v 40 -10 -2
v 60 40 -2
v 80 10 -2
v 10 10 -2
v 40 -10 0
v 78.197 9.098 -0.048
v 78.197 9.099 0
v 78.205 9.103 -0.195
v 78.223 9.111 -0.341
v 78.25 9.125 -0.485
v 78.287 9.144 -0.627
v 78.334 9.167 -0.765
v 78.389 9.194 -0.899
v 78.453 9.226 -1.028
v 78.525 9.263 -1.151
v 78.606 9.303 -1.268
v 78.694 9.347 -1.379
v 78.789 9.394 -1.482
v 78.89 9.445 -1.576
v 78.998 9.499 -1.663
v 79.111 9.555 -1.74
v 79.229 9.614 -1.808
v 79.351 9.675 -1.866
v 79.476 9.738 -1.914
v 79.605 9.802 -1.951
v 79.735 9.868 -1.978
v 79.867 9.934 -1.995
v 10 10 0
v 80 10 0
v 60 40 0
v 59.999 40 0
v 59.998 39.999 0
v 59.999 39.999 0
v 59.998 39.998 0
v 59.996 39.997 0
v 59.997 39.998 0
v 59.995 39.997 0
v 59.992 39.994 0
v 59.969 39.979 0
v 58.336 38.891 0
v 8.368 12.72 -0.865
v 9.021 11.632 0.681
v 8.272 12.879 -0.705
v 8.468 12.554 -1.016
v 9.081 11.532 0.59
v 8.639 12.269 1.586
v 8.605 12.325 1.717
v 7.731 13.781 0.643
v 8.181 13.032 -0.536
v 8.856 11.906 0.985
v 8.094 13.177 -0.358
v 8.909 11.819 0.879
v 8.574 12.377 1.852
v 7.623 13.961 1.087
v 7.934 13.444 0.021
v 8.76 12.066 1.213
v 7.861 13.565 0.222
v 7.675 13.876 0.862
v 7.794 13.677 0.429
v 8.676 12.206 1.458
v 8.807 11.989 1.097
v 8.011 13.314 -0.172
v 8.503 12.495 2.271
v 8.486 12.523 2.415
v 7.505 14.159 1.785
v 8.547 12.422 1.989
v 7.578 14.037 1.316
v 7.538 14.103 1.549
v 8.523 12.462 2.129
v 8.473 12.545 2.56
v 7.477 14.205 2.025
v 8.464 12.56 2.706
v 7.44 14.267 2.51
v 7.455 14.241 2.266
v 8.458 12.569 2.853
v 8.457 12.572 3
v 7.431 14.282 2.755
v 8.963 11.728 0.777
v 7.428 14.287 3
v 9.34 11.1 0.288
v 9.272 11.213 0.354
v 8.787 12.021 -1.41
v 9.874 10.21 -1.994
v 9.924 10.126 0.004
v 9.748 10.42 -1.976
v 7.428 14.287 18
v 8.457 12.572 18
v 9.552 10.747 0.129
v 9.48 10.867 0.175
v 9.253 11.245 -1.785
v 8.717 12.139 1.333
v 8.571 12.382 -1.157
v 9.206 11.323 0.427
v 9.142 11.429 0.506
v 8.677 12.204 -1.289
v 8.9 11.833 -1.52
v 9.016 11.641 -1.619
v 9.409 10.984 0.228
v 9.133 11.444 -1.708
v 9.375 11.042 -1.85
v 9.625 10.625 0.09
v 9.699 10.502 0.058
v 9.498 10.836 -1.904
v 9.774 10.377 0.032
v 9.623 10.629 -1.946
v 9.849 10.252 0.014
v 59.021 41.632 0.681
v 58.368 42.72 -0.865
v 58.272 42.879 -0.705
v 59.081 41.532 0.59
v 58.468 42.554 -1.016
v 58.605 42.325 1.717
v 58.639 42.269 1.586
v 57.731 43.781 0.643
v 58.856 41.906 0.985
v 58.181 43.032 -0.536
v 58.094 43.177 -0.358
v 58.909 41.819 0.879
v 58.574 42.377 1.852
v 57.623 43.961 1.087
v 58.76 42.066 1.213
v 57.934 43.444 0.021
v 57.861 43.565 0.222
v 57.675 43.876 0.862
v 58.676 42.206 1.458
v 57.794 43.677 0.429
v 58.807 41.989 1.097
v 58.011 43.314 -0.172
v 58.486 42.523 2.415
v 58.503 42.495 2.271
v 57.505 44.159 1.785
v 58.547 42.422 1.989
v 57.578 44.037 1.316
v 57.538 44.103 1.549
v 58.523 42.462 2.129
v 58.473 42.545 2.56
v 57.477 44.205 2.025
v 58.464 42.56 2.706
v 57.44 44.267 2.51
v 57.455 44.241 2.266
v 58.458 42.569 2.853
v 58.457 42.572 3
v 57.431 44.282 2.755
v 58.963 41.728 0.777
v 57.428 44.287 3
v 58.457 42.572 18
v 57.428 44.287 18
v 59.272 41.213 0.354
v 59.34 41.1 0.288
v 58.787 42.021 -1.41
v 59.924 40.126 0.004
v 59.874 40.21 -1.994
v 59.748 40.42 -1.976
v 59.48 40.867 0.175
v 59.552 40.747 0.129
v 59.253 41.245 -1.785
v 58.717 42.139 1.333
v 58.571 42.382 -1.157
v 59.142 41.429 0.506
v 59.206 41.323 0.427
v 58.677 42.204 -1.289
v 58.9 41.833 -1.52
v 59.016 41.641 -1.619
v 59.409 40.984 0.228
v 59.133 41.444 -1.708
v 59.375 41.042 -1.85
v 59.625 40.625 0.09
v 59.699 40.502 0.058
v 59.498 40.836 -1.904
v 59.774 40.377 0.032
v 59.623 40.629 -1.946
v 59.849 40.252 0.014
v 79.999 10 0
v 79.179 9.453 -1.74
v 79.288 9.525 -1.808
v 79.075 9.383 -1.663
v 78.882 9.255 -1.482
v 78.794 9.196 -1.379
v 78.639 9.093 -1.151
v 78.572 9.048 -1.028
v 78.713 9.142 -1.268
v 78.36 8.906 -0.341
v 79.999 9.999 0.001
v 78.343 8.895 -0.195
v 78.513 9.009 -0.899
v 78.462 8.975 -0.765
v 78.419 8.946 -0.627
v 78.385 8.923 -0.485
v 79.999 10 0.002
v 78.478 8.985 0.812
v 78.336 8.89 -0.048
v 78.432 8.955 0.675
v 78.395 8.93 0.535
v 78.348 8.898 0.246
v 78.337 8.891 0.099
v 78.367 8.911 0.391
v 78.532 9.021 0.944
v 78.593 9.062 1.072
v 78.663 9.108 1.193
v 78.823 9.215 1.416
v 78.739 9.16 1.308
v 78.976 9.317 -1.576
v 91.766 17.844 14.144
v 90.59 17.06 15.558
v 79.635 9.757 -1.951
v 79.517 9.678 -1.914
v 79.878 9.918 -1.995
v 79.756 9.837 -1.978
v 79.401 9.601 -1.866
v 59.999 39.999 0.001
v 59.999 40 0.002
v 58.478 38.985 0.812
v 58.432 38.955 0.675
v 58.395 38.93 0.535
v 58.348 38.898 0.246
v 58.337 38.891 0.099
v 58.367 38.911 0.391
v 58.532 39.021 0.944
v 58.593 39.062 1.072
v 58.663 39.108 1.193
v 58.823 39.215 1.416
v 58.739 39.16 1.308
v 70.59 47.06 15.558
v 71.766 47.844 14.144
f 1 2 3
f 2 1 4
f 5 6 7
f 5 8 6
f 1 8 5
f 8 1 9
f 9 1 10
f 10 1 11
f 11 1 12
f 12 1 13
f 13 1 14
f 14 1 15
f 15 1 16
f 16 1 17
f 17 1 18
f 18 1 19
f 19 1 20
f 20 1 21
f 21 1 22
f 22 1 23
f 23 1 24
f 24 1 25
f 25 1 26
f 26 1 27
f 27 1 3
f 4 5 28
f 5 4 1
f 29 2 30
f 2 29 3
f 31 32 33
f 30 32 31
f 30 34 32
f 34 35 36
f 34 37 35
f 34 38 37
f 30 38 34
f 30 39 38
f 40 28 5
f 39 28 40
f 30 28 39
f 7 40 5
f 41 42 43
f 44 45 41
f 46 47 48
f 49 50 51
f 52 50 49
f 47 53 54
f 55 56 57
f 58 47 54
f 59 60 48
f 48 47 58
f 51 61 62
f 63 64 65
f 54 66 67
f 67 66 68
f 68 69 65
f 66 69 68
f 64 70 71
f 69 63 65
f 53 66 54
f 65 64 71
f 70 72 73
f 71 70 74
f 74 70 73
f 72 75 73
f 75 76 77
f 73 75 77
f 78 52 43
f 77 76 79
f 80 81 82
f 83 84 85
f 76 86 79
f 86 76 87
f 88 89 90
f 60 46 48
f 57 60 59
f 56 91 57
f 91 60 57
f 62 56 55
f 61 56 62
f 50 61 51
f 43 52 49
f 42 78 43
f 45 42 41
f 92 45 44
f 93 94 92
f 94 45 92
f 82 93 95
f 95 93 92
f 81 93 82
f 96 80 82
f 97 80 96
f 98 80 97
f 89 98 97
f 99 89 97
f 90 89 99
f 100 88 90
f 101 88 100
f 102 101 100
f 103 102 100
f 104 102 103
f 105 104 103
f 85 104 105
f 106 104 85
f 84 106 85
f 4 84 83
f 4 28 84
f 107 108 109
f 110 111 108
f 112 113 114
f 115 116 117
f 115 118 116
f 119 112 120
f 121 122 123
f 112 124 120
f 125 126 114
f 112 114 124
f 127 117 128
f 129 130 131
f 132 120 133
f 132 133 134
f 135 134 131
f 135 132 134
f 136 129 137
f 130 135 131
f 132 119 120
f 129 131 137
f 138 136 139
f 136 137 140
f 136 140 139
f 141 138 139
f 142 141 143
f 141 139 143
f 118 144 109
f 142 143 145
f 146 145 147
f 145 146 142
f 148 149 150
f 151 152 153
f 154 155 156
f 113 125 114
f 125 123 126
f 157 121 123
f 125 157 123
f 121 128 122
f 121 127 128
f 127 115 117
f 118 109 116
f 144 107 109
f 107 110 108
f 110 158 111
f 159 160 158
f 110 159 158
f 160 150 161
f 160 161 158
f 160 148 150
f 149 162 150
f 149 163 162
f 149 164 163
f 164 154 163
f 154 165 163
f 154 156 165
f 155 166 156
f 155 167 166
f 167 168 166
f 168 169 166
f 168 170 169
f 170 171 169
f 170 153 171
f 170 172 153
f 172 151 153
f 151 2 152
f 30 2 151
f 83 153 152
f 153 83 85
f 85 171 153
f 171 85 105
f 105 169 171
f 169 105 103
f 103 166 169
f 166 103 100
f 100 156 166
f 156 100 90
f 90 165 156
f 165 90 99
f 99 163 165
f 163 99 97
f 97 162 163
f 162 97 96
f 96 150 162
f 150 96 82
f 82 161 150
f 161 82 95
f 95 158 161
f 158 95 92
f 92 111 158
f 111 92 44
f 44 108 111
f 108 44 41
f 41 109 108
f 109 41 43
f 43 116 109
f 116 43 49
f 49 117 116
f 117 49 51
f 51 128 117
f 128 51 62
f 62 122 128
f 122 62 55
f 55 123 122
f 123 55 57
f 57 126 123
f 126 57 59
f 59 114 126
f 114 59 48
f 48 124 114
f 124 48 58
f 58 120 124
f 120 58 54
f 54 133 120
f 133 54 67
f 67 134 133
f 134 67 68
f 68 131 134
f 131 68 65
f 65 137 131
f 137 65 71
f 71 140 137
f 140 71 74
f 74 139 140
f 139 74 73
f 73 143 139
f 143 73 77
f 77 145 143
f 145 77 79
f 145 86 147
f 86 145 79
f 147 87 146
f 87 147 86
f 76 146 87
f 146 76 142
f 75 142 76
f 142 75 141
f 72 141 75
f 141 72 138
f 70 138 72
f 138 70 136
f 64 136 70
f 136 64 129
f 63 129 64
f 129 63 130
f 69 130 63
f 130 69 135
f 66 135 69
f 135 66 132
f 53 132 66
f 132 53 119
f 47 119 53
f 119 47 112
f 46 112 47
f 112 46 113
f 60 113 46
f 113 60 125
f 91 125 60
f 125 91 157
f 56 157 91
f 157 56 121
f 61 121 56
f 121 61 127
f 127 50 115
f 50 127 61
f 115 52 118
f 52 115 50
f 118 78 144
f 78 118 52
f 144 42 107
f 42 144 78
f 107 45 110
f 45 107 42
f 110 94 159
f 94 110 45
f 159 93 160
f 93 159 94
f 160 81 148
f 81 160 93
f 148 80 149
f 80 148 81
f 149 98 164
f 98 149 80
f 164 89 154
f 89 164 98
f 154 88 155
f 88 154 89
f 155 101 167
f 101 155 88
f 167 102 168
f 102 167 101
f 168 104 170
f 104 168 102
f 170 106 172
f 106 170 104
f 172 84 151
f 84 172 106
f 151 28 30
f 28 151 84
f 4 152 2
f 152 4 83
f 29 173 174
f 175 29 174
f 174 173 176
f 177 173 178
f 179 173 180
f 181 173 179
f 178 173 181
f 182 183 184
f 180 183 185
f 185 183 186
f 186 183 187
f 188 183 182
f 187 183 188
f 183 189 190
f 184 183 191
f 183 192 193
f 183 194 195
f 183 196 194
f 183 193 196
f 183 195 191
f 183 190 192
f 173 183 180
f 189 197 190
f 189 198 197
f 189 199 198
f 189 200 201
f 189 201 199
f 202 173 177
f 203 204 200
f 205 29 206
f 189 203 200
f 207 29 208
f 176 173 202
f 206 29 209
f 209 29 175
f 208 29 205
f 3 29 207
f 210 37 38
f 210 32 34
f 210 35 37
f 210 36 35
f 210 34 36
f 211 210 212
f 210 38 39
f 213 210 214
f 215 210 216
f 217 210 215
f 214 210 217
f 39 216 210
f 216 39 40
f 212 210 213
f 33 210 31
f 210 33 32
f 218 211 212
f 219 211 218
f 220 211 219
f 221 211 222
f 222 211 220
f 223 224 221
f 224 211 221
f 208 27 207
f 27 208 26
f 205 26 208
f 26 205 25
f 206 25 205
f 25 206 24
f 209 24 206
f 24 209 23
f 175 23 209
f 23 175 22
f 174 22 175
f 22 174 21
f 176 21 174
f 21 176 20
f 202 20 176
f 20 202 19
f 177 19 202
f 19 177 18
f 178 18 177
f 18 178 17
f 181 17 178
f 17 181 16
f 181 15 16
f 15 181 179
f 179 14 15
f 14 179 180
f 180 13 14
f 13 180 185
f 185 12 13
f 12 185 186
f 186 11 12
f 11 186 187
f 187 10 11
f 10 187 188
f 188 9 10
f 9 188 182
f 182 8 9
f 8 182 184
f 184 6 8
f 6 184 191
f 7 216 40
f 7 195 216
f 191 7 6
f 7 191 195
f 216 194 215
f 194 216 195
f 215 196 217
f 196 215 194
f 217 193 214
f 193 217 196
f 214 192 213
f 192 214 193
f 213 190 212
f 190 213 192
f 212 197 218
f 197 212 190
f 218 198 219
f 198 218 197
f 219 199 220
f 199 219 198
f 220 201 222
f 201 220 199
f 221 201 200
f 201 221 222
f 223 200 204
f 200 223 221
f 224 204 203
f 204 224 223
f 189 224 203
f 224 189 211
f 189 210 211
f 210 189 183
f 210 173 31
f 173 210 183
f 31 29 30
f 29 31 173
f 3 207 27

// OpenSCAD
// ==========================================
// Example Usage & Visualization
// ==========================================

// 1. Draw a dummy base plate for visual context
// (Assuming the base plate extends into the +Y direction and thickness goes down into -Z)
color("LightSlateGray")
translate([0, 0, -2]) // Offset by -thickness
    linear_extrude(height = 2, center = false)
        polygon(points=[[10,10], [60,40], [80,10], [40,-10]]);

// 2. Flange 1: 90-degree bend with a LARGE RADIUS (5mm)
color("SteelBlue")
wall_on_edge(
    p1 = [10, 10], 
    p2 = [60, 40], 
    bend_angle = 90, 
    height = 15, 
    thickness = 2,
    radius = 3 // Noticeable curved bend
);

// 3. Flange 2: Obtuse bend (135 deg) with a SHARP RADIUS (0mm)
color("DarkOrange")
wall_on_edge(
    p1 = [80, 10], 
    p2 = [60, 40], 
    bend_angle = 135, 
    height = 20, 
    thickness = 2,
    radius = 0 // Simulates a sharp fold
);

// --------------------------------------------------------
// Parametric "Wall on Edge" with Bend Radius
// --------------------------------------------------------

module wall_on_edge(p1, p2, bend_angle, height, thickness, radius=0) {
    // 1. Calculate the edge length and heading vector
    dx = p2[0] - p1[0];
    dy = p2[1] - p1[1];
    edge_length = norm([dx, dy]);
    z_rot = atan2(dy, dx);
    
    // Clamp radius to a tiny number if 0 is entered to prevent degenerate geometry
    r = max(radius, 0.001);
    
    // 2. Position and orient the extruded profile
    translate([p1[0], p1[1], 0])
        rotate([0, 0, z_rot])
            // Map the 2D profile axes into 3D edge space:
            // Extrusion Z-axis -> Local X (along the edge)
            // Profile X-axis   -> Local Y (perpendicular to edge on base plate)
            // Profile Y-axis   -> Local Z (upwards)
            rotate([0, 90, 0])
                rotate([0, 0, 90])
                    linear_extrude(height = edge_length)
                        flange_profile_2d(thickness, height, bend_angle, r);
}

// --------------------------------------------------------
// 2D Sheet Metal Cross-Section Generator
// --------------------------------------------------------
module flange_profile_2d(t, h, angle, r) {
    fn = 32; // Resolution of the bend arcs
    start_a = -90;
    end_a = -90 + angle;
    
    // Construct the continuous polygon for the cross-section
    polygon([
        // 1. Inner Arc
        for (i = [0 : fn])
            let (a = start_a + i * (angle / fn))
                [ r * cos(a), r + r * sin(a) ],
                
        // 2. Inner edge of the straight wall
        [ r * cos(end_a) - h * sin(end_a), 
          r + r * sin(end_a) + h * cos(end_a) ],
          
        // 3. Outer edge of the straight wall
        [ (r + t) * cos(end_a) - h * sin(end_a), 
          r + (r + t) * sin(end_a) + h * cos(end_a) ],
          
        // 4. Outer Arc (drawn in reverse to close the polygon)
        for (i = [fn : -1 : 0])
            let (a = start_a + i * (angle / fn))
                [ (r + t) * cos(a), r + (r + t) * sin(a) ]
    ]);
}
